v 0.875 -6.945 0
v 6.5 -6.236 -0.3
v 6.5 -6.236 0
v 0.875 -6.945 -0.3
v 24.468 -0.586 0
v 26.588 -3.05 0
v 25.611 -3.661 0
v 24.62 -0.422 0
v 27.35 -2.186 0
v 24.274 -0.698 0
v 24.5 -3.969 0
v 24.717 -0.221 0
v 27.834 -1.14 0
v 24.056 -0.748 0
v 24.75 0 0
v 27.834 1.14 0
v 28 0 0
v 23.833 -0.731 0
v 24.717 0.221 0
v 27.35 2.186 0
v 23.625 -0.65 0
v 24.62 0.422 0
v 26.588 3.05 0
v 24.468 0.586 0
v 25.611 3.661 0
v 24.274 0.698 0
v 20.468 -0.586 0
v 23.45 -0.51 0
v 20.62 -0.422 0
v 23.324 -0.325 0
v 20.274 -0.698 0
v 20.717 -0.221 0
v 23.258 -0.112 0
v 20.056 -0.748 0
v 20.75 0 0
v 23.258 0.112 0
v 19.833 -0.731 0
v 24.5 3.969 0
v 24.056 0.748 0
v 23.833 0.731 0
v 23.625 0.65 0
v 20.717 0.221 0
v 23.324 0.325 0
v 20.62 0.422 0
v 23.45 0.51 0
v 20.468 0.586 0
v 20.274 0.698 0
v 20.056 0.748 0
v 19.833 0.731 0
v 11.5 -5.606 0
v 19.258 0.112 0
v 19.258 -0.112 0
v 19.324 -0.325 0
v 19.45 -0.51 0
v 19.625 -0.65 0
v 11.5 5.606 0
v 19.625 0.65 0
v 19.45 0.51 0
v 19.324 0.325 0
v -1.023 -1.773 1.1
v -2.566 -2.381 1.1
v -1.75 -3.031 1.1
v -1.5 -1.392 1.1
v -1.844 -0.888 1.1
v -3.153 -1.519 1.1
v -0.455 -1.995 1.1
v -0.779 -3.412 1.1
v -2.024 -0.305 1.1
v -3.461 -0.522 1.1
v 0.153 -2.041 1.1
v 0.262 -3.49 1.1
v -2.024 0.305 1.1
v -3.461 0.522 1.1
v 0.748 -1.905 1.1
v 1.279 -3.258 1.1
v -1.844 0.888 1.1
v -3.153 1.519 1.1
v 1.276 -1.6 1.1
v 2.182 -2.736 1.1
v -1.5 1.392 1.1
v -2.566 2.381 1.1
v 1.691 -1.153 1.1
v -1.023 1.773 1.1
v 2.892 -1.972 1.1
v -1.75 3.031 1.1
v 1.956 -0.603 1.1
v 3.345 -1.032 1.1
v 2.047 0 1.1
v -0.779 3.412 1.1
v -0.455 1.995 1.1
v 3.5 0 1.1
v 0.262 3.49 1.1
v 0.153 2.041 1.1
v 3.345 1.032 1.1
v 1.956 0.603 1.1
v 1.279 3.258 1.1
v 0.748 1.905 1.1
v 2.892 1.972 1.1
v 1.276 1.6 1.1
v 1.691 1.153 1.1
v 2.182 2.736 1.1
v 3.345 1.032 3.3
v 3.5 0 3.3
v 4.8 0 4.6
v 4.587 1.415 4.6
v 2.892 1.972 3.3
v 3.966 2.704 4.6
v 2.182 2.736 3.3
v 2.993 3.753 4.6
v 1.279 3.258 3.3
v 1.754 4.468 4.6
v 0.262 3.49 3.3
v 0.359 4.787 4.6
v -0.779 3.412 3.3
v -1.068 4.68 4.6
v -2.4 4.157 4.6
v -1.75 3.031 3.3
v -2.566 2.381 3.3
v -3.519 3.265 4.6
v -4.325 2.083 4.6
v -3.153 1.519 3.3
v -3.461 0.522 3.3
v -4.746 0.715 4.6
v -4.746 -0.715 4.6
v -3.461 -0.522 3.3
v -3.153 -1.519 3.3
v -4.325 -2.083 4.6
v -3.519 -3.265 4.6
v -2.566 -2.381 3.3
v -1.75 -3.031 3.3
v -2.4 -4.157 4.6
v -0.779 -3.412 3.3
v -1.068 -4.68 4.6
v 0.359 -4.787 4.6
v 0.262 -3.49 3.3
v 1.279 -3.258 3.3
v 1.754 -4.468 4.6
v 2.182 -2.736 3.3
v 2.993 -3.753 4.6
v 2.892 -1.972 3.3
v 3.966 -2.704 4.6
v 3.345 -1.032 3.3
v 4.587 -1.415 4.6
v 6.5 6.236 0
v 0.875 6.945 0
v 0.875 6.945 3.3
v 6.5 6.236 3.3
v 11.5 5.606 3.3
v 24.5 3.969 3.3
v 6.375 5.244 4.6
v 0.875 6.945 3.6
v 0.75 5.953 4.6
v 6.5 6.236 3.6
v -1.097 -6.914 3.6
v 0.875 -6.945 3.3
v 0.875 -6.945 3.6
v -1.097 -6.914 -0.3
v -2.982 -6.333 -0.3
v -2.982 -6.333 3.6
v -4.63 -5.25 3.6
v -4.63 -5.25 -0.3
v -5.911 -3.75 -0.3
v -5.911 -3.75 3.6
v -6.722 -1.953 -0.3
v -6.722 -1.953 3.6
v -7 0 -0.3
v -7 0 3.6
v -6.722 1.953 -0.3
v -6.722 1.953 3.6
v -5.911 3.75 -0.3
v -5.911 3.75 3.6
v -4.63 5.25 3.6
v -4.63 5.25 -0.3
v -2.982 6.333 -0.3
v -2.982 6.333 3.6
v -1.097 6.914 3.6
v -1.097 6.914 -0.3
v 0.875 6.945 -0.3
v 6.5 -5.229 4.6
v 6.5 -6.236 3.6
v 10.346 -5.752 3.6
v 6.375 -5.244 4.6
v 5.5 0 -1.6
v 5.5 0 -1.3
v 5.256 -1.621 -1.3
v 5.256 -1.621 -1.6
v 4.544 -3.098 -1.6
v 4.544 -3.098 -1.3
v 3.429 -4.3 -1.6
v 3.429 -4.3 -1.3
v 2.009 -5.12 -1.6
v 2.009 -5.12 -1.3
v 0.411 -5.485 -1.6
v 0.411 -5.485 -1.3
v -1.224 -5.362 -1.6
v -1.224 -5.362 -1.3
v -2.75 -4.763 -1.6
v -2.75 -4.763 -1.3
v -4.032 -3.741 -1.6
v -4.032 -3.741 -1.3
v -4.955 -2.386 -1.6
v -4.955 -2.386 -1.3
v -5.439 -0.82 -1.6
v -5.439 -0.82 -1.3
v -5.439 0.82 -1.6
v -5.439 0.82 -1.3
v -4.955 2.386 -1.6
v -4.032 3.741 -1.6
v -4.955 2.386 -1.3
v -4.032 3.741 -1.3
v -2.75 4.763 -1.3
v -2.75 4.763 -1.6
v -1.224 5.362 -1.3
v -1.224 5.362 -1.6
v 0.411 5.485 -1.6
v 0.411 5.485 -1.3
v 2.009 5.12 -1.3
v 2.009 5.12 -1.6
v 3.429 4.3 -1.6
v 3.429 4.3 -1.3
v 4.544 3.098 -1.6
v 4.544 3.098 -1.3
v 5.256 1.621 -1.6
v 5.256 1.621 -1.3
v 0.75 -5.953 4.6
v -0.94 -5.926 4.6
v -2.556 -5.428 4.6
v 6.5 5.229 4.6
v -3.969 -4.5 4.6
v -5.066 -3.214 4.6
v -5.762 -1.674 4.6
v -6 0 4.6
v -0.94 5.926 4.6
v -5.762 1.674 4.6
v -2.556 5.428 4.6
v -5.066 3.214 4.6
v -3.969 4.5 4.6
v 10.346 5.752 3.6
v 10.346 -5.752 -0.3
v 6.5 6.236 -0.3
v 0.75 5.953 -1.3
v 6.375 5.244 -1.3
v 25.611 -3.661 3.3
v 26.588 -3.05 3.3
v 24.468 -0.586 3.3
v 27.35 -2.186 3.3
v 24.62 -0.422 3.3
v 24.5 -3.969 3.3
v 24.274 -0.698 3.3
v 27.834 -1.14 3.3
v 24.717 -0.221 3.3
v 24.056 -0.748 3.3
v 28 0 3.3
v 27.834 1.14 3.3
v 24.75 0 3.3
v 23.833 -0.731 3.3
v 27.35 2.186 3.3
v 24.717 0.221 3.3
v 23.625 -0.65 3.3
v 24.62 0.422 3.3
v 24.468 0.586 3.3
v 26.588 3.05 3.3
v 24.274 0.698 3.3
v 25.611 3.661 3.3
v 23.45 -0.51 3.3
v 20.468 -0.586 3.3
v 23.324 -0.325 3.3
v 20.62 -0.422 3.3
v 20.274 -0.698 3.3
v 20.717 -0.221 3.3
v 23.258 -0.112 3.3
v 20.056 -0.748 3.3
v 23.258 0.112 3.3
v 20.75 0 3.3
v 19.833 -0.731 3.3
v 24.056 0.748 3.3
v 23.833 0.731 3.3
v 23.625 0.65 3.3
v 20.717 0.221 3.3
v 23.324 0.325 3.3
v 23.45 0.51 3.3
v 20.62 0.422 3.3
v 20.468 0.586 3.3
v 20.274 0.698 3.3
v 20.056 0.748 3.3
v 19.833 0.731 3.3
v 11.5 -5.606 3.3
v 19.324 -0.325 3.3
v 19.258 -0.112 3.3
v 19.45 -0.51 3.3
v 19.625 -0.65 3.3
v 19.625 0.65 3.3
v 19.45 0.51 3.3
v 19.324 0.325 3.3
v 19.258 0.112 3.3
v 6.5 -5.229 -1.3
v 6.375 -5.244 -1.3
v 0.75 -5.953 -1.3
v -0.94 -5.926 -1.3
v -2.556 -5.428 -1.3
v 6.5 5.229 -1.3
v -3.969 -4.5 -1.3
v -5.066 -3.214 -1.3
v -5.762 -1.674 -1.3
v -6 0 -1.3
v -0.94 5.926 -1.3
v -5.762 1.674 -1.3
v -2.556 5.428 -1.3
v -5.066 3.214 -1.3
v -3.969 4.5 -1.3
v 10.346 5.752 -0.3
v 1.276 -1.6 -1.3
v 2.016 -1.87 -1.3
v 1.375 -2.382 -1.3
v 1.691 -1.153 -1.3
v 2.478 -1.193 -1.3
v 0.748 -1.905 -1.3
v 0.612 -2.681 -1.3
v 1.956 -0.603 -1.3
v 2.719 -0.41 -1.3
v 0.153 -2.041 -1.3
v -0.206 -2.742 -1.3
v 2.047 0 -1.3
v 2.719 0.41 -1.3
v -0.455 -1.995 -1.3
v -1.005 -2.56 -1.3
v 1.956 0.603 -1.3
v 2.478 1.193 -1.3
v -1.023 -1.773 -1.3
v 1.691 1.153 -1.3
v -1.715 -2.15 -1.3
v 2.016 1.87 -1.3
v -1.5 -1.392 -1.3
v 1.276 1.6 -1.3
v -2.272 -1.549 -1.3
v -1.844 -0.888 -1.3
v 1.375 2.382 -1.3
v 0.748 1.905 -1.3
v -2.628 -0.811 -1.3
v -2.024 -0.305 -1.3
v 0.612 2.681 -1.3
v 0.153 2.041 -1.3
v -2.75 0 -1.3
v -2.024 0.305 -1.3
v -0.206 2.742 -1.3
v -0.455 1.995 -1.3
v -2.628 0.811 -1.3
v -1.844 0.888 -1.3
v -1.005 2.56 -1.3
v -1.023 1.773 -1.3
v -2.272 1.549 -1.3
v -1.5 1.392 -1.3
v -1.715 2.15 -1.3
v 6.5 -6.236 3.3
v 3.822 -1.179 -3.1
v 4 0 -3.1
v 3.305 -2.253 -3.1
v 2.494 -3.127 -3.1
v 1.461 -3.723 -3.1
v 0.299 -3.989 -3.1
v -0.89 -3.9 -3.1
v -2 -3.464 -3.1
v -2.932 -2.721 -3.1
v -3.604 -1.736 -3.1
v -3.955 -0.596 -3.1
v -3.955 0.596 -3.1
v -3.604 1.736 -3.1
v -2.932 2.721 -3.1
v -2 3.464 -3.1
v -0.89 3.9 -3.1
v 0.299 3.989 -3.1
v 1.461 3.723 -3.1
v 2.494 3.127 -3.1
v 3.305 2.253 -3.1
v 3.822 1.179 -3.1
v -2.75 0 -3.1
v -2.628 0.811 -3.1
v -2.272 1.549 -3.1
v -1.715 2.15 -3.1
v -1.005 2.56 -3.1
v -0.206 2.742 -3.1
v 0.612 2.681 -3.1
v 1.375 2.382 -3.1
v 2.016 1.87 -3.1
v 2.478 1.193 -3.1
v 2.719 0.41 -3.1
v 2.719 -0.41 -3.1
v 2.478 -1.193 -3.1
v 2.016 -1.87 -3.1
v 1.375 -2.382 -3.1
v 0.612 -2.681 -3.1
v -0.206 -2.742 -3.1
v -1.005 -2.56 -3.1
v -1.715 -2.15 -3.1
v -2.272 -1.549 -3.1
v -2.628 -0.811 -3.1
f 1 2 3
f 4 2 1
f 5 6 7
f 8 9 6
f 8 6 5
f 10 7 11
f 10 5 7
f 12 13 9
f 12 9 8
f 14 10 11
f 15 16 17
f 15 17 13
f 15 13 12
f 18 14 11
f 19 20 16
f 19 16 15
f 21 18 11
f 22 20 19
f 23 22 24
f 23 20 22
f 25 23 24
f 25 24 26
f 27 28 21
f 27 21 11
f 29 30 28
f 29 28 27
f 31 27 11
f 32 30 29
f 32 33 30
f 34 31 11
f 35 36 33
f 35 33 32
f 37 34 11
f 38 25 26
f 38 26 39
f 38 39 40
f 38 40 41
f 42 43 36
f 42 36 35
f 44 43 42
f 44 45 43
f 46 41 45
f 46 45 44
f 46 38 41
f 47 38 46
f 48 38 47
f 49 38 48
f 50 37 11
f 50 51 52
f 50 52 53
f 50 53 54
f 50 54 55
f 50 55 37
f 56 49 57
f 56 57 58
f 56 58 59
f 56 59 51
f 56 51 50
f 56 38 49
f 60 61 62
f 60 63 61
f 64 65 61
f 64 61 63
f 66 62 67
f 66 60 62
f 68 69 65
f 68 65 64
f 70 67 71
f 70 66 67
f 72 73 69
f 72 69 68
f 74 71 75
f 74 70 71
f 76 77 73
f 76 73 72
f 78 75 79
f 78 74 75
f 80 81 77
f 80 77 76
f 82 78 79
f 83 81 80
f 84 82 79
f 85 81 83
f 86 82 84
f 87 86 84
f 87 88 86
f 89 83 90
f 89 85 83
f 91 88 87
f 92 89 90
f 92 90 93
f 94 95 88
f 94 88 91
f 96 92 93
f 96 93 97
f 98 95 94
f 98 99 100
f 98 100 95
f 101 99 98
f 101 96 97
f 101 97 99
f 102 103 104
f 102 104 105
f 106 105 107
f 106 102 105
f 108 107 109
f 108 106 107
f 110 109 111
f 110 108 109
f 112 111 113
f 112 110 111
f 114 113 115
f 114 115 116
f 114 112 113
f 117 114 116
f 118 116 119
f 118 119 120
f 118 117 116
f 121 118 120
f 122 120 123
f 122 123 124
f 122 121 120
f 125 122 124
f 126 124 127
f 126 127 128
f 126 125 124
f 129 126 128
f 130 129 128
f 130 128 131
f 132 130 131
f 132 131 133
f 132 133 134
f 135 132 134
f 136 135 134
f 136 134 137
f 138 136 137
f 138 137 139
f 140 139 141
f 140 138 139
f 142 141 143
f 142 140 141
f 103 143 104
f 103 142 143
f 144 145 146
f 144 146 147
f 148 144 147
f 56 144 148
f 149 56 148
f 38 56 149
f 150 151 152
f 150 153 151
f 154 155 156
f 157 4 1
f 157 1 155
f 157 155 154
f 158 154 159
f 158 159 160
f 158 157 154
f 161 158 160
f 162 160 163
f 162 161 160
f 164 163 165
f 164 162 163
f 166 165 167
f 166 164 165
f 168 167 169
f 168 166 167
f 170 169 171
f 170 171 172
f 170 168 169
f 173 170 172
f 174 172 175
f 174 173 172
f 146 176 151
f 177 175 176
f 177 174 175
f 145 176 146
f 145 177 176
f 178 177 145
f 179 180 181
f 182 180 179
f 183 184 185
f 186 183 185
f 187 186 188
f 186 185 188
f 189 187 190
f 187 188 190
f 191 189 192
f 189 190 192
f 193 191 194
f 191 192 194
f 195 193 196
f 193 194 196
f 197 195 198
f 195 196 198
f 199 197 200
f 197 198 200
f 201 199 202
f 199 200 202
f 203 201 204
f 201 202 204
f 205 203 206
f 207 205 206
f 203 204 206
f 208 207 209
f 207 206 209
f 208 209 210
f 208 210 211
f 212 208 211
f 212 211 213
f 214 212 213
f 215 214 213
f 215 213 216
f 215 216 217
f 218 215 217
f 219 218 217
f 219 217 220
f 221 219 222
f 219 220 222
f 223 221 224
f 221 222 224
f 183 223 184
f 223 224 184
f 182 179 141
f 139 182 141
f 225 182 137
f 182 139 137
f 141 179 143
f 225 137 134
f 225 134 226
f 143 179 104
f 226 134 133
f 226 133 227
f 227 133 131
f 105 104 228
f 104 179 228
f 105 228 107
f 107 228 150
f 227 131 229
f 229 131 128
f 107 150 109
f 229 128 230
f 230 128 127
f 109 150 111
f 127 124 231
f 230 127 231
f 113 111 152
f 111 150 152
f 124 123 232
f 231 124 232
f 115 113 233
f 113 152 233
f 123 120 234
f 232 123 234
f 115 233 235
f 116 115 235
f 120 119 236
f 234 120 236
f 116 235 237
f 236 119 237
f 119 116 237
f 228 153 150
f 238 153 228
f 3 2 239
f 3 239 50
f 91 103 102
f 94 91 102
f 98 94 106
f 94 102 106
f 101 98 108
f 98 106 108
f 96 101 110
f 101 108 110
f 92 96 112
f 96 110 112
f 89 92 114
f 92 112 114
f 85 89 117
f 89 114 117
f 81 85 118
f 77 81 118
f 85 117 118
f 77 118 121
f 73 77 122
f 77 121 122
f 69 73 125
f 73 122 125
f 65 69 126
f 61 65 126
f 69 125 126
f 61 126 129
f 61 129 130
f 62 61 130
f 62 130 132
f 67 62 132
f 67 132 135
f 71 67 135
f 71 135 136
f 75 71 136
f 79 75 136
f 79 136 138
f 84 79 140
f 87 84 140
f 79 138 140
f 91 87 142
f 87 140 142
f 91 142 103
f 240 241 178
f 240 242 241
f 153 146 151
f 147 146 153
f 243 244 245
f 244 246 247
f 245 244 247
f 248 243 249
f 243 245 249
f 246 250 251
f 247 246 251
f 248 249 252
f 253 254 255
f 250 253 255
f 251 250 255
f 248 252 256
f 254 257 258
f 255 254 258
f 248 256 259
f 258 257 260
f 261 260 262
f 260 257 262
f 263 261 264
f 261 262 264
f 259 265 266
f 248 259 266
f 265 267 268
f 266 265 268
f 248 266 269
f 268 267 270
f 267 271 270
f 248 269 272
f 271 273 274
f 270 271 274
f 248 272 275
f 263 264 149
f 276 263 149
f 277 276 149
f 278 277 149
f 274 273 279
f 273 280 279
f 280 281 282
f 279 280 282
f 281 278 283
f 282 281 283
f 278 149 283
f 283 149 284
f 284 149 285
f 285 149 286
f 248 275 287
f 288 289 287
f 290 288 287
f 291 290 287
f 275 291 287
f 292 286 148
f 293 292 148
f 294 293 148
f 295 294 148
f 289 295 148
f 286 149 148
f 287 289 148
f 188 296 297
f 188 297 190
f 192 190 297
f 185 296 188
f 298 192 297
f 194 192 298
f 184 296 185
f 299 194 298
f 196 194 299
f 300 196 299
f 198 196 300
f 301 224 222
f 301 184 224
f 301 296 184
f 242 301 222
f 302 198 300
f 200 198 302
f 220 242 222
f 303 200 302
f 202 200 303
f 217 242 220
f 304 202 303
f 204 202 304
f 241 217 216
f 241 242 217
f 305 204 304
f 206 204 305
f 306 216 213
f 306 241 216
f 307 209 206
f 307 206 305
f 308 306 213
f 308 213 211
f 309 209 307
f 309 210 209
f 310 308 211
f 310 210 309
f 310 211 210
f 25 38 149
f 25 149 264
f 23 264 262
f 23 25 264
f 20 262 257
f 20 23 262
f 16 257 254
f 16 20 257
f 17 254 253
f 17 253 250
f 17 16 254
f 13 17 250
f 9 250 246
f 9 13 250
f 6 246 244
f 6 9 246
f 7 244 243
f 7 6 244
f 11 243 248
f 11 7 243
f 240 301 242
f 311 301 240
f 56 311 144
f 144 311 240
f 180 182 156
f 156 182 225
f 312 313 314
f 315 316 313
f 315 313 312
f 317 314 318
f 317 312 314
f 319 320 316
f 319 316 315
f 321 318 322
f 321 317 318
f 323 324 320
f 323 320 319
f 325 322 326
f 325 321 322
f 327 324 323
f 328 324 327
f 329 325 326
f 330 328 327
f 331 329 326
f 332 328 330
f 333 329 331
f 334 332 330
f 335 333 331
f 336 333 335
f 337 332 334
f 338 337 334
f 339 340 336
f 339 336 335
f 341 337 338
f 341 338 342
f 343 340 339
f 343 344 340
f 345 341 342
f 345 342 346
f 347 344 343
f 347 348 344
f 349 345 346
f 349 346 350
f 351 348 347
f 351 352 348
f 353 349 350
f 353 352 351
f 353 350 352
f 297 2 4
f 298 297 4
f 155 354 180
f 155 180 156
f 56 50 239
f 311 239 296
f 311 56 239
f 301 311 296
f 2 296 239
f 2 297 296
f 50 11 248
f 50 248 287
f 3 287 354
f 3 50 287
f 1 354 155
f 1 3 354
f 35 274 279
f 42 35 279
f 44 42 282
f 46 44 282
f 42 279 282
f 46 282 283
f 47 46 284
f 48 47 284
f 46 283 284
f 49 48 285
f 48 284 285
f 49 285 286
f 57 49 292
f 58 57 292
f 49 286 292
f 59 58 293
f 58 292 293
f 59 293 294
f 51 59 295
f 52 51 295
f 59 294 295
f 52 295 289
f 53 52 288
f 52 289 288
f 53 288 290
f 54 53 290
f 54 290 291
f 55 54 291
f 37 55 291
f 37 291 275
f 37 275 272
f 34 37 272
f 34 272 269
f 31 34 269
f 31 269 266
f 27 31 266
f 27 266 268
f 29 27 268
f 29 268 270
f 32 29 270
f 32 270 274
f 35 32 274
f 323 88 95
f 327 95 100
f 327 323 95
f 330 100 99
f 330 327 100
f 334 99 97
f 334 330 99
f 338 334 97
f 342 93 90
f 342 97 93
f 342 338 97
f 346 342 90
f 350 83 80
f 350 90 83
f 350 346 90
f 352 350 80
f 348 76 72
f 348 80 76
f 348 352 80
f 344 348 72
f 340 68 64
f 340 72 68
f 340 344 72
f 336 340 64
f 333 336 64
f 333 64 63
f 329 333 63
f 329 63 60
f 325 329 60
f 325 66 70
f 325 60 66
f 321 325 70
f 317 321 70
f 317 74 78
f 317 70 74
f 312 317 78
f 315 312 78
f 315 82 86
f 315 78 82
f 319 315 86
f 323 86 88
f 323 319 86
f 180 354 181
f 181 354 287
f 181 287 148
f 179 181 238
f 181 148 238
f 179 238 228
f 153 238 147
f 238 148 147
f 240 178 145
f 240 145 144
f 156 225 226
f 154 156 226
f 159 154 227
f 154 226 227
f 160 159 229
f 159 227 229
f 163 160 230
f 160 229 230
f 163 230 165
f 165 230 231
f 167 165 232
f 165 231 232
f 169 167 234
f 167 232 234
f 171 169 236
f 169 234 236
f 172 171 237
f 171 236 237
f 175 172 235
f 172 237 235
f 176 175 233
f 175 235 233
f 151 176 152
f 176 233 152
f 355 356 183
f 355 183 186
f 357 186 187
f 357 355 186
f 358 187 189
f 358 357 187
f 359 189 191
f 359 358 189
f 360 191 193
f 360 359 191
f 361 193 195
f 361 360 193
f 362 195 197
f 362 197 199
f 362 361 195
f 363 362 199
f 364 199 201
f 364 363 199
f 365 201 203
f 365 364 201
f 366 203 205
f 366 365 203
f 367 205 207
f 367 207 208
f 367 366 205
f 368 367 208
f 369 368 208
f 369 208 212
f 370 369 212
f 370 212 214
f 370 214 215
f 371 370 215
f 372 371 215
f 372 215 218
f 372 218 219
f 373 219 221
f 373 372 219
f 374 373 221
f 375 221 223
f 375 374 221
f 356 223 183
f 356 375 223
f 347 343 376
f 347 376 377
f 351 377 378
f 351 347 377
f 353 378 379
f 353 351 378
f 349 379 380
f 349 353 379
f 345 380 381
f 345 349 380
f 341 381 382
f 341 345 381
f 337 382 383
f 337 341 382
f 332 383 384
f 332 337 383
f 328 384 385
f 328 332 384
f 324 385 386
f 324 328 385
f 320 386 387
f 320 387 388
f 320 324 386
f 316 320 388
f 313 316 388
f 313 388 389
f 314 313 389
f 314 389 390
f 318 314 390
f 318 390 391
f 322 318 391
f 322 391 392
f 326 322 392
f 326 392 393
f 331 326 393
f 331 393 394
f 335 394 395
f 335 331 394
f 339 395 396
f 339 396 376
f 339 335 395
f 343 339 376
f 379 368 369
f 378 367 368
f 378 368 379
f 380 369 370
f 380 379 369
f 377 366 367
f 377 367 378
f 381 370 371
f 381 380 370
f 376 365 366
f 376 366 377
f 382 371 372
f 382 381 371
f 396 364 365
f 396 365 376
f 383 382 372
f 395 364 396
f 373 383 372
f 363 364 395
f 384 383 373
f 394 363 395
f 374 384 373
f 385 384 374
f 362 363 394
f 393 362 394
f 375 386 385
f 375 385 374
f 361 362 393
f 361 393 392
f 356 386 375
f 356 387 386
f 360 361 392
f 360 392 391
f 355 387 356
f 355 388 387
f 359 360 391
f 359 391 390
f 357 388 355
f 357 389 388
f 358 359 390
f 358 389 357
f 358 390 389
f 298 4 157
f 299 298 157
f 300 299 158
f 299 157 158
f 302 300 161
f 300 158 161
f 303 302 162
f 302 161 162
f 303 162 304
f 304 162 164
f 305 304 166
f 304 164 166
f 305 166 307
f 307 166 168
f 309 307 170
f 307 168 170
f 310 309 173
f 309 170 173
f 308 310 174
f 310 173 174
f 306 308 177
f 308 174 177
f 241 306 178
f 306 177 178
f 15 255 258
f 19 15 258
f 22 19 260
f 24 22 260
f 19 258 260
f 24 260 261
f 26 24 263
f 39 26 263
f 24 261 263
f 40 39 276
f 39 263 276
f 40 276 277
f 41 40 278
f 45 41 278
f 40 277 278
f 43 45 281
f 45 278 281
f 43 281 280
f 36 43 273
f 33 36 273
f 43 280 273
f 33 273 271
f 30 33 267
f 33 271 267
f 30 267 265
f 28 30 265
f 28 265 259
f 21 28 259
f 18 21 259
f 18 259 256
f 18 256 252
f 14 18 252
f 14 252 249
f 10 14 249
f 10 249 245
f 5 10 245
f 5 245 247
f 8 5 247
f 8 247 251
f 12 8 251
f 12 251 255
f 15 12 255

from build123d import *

# Parameters (mm, degrees)
ESQUISSE1_R             = 2.046773471
BOSS_EXTRU_1_DEPTH      = 3.3
BOSS_EXTRU_2_DEPTH      = 1.3
BOSS_EXTRU_2_DEPTH_BACK = 4.6
ESQUISSE2_R             = 2.046773471
CHANFREIN1_SIZE         = 5
CHANFREIN1_SIZE_2       = 1.3
CHANFREIN3_SIZE         = 5
CHANFREIN3_SIZE_2       = 1.3
CHANFREIN2_SIZE         = 1
ESQUISSE3_R             = 5.5
ESQUISSE3_R_2           = 2.75
BOSS_EXTRU_3_DEPTH      = 1.8
CHANFREIN4_SIZE         = 1.5
ESQUISSE4_R             = 3.5
ENL_V_MAT_EXTRU_1_DEPTH = 3.5
CHANFREIN5_SIZE         = 1.3
ESQUISSE5_R             = 0.75
ENL_V_MAT_EXTRU_2_DEPTH = 3.5


with BuildPart() as part:
    # Esquisse1 → Boss.-Extru.1 (new body)
    with BuildSketch(Plane.XY):
        with BuildLine():
            Line((0.875, 6.945097192), (24.5, 3.968626967))
            ThreePointArc((24.5, 3.968626967), (28, 0), (24.5, -3.968626967))
            Line((24.5, -3.968626967), (0.875, -6.945097192))
            ThreePointArc((0.875, -6.945097192), (-7, 0), (0.875, 6.945097192))
        make_face()
        Circle(ESQUISSE1_R, mode=Mode.SUBTRACT)
    extrude(amount=BOSS_EXTRU_1_DEPTH)

    # Esquisse2 → Boss.-Extru.2 (add, two sides: drawn at the far end of the back side and taken through both)
    with BuildSketch(Plane.XY.offset(3.3).offset(-BOSS_EXTRU_2_DEPTH_BACK)):
        with BuildLine():
            Line((0.875, 6.945097192), (6.5, 6.236413805))
            Line((6.5, 6.236413805), (6.5, -6.236413805))
            Line((6.5, -6.236413805), (0.875, -6.945097192))
            ThreePointArc((0.875, -6.945097192), (-7, 0), (0.875, 6.945097192))
        make_face()
        Circle(ESQUISSE2_R, mode=Mode.SUBTRACT)
    extrude(amount=BOSS_EXTRU_2_DEPTH + BOSS_EXTRU_2_DEPTH_BACK)

    # Chanfrein1
    # the kernel refuses this chamfer: 5, 1.3 mm, written as the material it adds along each edge
    with BuildSketch(Plane(origin=(6.5, 19.22093464, 3.3), x_dir=(0.9999530531472482, 0, -0.009689762716214913), z_dir=(0, -1, 0))) as chanfrein1_piece_1_section:
        Polygon((CHANFREIN1_SIZE * 0.999953053147, CHANFREIN1_SIZE * 0.00968976271621), (-CHANFREIN1_SIZE_2 * 0.00968976271621, CHANFREIN1_SIZE_2 * 0.999953053147), (0, 0), align=None)
    chanfrein1_piece_1 = extrude(amount=38.441869281, mode=Mode.PRIVATE)
    chanfrein1_piece_1 = split(chanfrein1_piece_1, bisect_by=Plane(origin=(8.958471047, 5.926675567, 3.684204829), z_dir=(-0.12500000000000006, -0.9921567416492215, 0)), keep=Keep.TOP, mode=Mode.PRIVATE)
    chanfrein1_piece_1 = split(chanfrein1_piece_1, bisect_by=Plane(origin=(8.958471047, -5.926675567, 3.684204829), z_dir=(-0.1249999999999999, 0.9921567416492215, 0)), keep=Keep.TOP, mode=Mode.PRIVATE)
    chanfrein1_piece_1 = split(chanfrein1_piece_1, bisect_by=Plane(origin=(8.211780112, 0, 4.6), z_dir=(0, 0, -1)), keep=Keep.TOP, mode=Mode.PRIVATE)
    add(chanfrein1_piece_1)

    # Chanfrein3
    # the kernel refuses this chamfer: 5, 1.3 mm, written as the material it adds along each edge
    with BuildSketch(Plane(origin=(6.5, 19.22093464, 0), x_dir=(0.9999530531472482, 0, 0.009689762716214958), z_dir=(0, -1, 0))) as chanfrein3_piece_1_section:
        Polygon((CHANFREIN3_SIZE * 0.999953053147, -CHANFREIN3_SIZE * 0.00968976271621), (-CHANFREIN3_SIZE_2 * 0.00968976271621, -CHANFREIN3_SIZE_2 * 0.999953053147), (0, 0), align=None)
    chanfrein3_piece_1 = extrude(amount=38.441869281, mode=Mode.PRIVATE)
    chanfrein3_piece_1 = split(chanfrein3_piece_1, bisect_by=Plane(origin=(8.958471047, 5.926675567, -0.384204829), z_dir=(-0.1250000000000275, -0.9921567416492181, 0)), keep=Keep.TOP, mode=Mode.PRIVATE)
    chanfrein3_piece_1 = split(chanfrein3_piece_1, bisect_by=Plane(origin=(8.958471047, -5.926675567, -0.384204829), z_dir=(-0.1250000000000275, 0.9921567416492181, 0)), keep=Keep.TOP, mode=Mode.PRIVATE)
    chanfrein3_piece_1 = split(chanfrein3_piece_1, bisect_by=Plane(origin=(8.211780112, 0, -1.3), z_dir=(0, 0, 1)), keep=Keep.TOP, mode=Mode.PRIVATE)
    add(chanfrein3_piece_1)

    # Chanfrein2
    chanfrein2_edges = [part.edges().sort_by_distance(p)[0] for p in [
        (-7, 0, -1.3),
        (3.6875, 6.590755498, -1.3),
        (3.6875, -6.590755498, -1.3),
        (-7, 0, 4.6),
        (3.6875, -6.590755498, 4.6),
        (3.6875, 6.590755498, 4.6),
    ]]
    chamfer(chanfrein2_edges, length=CHANFREIN2_SIZE)

    # Esquisse3 → Boss.-Extru.3 (add)
    with BuildSketch(Plane(origin=(0, 0, -1.3), x_dir=(-1, 0, 0), z_dir=(0, 0, -1))):
        with Locations(Location((0, 0, 0), (0, 0, 180))):
            Circle(ESQUISSE3_R)
        Circle(ESQUISSE3_R_2, mode=Mode.SUBTRACT)
    extrude(amount=BOSS_EXTRU_3_DEPTH)

    # Chanfrein4
    chanfrein4_edges = [part.edges().sort_by_distance(p)[0] for p in [
        (-5.5, 0, -3.1),
    ]]
    chamfer(chanfrein4_edges, length=CHANFREIN4_SIZE)

    # Esquisse4 → Enlèv. mat.-Extru.1 (cut)
    with BuildSketch(Plane.XY.offset(4.6)):
        Circle(ESQUISSE4_R)
    extrude(amount=-ENL_V_MAT_EXTRU_1_DEPTH, mode=Mode.SUBTRACT)

    # Chanfrein5
    chanfrein5_edges = [part.edges().sort_by_distance(p)[0] for p in [
        (-3.5, 0, 4.6),
    ]]
    chamfer(chanfrein5_edges, length=CHANFREIN5_SIZE)

    # Esquisse5 → Enlèv. mat.-Extru.2 (cut)
    with BuildSketch(Plane.XY.offset(3.3)):
        with Locations((24, 0)):
            Circle(ESQUISSE5_R)
        with Locations((20, 0)):
            Circle(ESQUISSE5_R)
    extrude(amount=-ENL_V_MAT_EXTRU_2_DEPTH, mode=Mode.SUBTRACT)


solid = part.part
